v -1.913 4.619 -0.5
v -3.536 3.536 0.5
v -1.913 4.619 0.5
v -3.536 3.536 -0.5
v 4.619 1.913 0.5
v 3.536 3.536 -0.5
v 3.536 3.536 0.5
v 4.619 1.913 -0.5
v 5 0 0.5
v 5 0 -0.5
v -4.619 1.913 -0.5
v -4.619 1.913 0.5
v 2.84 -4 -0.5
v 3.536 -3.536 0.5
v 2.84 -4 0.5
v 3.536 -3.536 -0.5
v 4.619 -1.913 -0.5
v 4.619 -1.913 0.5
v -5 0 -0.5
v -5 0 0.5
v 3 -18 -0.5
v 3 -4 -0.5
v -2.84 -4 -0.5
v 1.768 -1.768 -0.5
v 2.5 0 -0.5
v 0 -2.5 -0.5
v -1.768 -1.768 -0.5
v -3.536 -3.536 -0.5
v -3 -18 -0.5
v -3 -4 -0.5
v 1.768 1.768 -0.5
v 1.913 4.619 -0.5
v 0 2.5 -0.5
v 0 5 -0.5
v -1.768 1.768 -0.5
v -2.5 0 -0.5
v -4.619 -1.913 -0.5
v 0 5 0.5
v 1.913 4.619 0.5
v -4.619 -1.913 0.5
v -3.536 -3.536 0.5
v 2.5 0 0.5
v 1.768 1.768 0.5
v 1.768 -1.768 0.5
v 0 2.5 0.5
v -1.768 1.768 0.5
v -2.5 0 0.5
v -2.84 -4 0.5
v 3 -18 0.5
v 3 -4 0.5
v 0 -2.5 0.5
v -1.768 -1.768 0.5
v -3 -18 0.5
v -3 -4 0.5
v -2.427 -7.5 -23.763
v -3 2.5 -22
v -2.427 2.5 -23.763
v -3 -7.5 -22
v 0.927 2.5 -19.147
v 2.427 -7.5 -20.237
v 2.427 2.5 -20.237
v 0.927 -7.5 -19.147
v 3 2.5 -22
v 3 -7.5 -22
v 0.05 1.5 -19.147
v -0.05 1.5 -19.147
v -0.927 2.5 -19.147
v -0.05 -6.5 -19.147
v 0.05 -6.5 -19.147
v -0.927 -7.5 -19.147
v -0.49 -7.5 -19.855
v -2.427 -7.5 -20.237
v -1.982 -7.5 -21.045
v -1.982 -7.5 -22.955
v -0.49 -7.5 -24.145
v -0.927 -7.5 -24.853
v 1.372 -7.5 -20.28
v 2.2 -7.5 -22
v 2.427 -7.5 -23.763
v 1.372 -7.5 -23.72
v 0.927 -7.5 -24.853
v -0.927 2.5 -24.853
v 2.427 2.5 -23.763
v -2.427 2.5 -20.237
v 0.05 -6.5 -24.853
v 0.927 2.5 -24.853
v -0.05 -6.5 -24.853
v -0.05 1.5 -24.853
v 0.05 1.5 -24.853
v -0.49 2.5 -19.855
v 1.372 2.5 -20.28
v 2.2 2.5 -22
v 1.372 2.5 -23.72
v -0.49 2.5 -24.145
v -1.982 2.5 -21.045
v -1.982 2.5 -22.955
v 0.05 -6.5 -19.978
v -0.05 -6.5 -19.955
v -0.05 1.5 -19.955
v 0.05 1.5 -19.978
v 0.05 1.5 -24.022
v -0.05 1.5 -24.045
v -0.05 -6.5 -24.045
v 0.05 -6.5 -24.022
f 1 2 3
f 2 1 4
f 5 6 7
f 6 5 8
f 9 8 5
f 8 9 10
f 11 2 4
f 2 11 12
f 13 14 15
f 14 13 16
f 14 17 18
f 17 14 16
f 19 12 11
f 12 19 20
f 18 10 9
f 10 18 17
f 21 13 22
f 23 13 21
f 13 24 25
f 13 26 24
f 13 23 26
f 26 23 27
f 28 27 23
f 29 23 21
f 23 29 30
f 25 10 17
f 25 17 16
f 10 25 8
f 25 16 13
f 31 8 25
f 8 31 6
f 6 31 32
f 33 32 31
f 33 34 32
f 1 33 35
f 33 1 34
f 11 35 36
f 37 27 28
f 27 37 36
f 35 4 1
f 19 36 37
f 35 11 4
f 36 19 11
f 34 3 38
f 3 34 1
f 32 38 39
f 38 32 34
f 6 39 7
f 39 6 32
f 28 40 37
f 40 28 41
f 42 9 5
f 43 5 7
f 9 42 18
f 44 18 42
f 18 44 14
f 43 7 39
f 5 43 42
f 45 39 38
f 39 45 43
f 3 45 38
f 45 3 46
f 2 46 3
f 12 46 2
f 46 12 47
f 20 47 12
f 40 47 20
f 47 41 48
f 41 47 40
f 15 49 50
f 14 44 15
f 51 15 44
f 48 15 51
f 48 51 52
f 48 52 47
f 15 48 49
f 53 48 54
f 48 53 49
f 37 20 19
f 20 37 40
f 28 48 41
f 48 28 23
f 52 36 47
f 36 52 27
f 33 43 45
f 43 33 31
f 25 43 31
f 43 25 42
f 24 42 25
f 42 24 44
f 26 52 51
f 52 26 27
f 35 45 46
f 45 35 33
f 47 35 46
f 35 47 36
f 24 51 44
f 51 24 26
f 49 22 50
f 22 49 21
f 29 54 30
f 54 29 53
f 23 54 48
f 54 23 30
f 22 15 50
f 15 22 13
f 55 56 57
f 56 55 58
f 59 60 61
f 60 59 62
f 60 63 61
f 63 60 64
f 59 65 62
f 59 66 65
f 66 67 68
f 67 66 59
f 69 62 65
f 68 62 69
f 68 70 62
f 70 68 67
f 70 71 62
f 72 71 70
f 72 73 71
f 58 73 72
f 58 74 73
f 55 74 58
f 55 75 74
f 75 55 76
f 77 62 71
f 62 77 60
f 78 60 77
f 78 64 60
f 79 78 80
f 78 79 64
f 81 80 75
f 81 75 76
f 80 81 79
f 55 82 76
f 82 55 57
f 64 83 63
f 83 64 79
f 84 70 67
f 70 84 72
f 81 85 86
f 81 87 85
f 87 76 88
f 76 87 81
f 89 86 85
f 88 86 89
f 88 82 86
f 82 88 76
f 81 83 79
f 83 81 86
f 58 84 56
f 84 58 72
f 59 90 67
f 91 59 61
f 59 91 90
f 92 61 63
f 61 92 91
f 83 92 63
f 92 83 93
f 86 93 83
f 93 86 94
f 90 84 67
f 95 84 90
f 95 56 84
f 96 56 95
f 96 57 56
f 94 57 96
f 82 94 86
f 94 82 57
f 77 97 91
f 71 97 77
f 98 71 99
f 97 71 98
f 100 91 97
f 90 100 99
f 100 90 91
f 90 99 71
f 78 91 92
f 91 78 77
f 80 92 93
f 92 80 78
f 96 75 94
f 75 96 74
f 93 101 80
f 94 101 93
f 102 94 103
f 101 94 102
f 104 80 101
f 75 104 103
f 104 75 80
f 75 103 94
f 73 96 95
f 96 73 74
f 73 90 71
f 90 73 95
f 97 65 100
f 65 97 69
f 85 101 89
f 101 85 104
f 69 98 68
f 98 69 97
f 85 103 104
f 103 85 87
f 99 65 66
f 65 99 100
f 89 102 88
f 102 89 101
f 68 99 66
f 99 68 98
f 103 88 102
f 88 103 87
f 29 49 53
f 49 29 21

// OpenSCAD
// Parameters
material_thickness = 1.0; //[0.5:2.0:0.1]
ring_outer_diameter = 10.0; //[5.0:20.0:0.5]
ring_inner_diameter = 5.0; //[2.5:10.0:0.5]
lug_width = 6.0; //[3.0:12.0:0.5]
overall_length = 25.0; //[12.5:50.0:1]
crimp_length = 10.0; //[5.0:20.0:1]
has_crimp_barrel = 1; //[0:1:1]
crimp_barrel_outer_diameter = 6.0; //[3.0:12.0:0.5]
crimp_barrel_wall_thickness = 0.8; //[0.4:1.6:0.1]
bend_angle_deg = 45.0; //[0.0:90.0:5.0]
wire_entry_slot = 1; //[0:1:1]
wire_entry_slot_width = 0.1; //[0.05:1.0:0.05]
overlap = 1.0; //[0.5:2.0:0.1]
neck_length = 12.0; //[6.0:24.0:1]
transition_length = 2.0; //[1.0:4.0:0.5]

// Ring Terminal - complete geometry
module ring_terminal() {
  color("Silver") {
    difference() {
      // Ring Lug Body
      translate([0, 0, 0])
        cylinder(r=ring_outer_diameter/2, h=material_thickness, center=true);
      // Ring Hole
      translate([0, 0, 0])
        cylinder(r=ring_inner_diameter/2, h=material_thickness + 2*overlap, center=true);
    }
    // Neck Tab
    translate([0, -(ring_outer_diameter/2 + neck_length/2 - overlap), 0])
      cube([lug_width, neck_length, material_thickness], center=true);
  }
}

// Ring Terminal Assembly - complete geometry
module ring_terminal_assembly() {
  color("Silver") {
    union() {
      ring_terminal();
      // Transition Block
      translate([0, -(ring_outer_diameter/2 + neck_length - overlap + transition_length/2), 0])
        cube([lug_width, transition_length, material_thickness], center=true);
      
      if (has_crimp_barrel) {
        // Crimp Barrel Outer
        rotate([90, 0, 0])
          translate([0, -(ring_outer_diameter/2 + neck_length - overlap + transition_length - overlap + crimp_length/2), crimp_barrel_outer_diameter/2 - material_thickness/2])
          difference() {
            cylinder(r=crimp_barrel_outer_diameter/2, h=crimp_length, center=true);
            // Crimp Barrel Inner
            cylinder(r=crimp_barrel_outer_diameter/2 - crimp_barrel_wall_thickness, h=crimp_length + 2*overlap, center=true);
            if (wire_entry_slot) {
              // Wire Entry Slot
              translate([0, 0, 0])
                cube([wire_entry_slot_width, crimp_length + 2*overlap, crimp_barrel_outer_diameter + 2*overlap], center=true);
            }
          }
      } else {
        // Bent Tab (if no crimp barrel)
        translate([0, -(ring_outer_diameter/2 + neck_length - overlap + transition_length/2), 0])
          rotate([bend_angle_deg, 0, 0])
          cube([lug_width, transition_length, material_thickness], center=true);
      }
    }
  }
}

// Assembly
module assembly() {
  ring_terminal_assembly();
}

assembly();
